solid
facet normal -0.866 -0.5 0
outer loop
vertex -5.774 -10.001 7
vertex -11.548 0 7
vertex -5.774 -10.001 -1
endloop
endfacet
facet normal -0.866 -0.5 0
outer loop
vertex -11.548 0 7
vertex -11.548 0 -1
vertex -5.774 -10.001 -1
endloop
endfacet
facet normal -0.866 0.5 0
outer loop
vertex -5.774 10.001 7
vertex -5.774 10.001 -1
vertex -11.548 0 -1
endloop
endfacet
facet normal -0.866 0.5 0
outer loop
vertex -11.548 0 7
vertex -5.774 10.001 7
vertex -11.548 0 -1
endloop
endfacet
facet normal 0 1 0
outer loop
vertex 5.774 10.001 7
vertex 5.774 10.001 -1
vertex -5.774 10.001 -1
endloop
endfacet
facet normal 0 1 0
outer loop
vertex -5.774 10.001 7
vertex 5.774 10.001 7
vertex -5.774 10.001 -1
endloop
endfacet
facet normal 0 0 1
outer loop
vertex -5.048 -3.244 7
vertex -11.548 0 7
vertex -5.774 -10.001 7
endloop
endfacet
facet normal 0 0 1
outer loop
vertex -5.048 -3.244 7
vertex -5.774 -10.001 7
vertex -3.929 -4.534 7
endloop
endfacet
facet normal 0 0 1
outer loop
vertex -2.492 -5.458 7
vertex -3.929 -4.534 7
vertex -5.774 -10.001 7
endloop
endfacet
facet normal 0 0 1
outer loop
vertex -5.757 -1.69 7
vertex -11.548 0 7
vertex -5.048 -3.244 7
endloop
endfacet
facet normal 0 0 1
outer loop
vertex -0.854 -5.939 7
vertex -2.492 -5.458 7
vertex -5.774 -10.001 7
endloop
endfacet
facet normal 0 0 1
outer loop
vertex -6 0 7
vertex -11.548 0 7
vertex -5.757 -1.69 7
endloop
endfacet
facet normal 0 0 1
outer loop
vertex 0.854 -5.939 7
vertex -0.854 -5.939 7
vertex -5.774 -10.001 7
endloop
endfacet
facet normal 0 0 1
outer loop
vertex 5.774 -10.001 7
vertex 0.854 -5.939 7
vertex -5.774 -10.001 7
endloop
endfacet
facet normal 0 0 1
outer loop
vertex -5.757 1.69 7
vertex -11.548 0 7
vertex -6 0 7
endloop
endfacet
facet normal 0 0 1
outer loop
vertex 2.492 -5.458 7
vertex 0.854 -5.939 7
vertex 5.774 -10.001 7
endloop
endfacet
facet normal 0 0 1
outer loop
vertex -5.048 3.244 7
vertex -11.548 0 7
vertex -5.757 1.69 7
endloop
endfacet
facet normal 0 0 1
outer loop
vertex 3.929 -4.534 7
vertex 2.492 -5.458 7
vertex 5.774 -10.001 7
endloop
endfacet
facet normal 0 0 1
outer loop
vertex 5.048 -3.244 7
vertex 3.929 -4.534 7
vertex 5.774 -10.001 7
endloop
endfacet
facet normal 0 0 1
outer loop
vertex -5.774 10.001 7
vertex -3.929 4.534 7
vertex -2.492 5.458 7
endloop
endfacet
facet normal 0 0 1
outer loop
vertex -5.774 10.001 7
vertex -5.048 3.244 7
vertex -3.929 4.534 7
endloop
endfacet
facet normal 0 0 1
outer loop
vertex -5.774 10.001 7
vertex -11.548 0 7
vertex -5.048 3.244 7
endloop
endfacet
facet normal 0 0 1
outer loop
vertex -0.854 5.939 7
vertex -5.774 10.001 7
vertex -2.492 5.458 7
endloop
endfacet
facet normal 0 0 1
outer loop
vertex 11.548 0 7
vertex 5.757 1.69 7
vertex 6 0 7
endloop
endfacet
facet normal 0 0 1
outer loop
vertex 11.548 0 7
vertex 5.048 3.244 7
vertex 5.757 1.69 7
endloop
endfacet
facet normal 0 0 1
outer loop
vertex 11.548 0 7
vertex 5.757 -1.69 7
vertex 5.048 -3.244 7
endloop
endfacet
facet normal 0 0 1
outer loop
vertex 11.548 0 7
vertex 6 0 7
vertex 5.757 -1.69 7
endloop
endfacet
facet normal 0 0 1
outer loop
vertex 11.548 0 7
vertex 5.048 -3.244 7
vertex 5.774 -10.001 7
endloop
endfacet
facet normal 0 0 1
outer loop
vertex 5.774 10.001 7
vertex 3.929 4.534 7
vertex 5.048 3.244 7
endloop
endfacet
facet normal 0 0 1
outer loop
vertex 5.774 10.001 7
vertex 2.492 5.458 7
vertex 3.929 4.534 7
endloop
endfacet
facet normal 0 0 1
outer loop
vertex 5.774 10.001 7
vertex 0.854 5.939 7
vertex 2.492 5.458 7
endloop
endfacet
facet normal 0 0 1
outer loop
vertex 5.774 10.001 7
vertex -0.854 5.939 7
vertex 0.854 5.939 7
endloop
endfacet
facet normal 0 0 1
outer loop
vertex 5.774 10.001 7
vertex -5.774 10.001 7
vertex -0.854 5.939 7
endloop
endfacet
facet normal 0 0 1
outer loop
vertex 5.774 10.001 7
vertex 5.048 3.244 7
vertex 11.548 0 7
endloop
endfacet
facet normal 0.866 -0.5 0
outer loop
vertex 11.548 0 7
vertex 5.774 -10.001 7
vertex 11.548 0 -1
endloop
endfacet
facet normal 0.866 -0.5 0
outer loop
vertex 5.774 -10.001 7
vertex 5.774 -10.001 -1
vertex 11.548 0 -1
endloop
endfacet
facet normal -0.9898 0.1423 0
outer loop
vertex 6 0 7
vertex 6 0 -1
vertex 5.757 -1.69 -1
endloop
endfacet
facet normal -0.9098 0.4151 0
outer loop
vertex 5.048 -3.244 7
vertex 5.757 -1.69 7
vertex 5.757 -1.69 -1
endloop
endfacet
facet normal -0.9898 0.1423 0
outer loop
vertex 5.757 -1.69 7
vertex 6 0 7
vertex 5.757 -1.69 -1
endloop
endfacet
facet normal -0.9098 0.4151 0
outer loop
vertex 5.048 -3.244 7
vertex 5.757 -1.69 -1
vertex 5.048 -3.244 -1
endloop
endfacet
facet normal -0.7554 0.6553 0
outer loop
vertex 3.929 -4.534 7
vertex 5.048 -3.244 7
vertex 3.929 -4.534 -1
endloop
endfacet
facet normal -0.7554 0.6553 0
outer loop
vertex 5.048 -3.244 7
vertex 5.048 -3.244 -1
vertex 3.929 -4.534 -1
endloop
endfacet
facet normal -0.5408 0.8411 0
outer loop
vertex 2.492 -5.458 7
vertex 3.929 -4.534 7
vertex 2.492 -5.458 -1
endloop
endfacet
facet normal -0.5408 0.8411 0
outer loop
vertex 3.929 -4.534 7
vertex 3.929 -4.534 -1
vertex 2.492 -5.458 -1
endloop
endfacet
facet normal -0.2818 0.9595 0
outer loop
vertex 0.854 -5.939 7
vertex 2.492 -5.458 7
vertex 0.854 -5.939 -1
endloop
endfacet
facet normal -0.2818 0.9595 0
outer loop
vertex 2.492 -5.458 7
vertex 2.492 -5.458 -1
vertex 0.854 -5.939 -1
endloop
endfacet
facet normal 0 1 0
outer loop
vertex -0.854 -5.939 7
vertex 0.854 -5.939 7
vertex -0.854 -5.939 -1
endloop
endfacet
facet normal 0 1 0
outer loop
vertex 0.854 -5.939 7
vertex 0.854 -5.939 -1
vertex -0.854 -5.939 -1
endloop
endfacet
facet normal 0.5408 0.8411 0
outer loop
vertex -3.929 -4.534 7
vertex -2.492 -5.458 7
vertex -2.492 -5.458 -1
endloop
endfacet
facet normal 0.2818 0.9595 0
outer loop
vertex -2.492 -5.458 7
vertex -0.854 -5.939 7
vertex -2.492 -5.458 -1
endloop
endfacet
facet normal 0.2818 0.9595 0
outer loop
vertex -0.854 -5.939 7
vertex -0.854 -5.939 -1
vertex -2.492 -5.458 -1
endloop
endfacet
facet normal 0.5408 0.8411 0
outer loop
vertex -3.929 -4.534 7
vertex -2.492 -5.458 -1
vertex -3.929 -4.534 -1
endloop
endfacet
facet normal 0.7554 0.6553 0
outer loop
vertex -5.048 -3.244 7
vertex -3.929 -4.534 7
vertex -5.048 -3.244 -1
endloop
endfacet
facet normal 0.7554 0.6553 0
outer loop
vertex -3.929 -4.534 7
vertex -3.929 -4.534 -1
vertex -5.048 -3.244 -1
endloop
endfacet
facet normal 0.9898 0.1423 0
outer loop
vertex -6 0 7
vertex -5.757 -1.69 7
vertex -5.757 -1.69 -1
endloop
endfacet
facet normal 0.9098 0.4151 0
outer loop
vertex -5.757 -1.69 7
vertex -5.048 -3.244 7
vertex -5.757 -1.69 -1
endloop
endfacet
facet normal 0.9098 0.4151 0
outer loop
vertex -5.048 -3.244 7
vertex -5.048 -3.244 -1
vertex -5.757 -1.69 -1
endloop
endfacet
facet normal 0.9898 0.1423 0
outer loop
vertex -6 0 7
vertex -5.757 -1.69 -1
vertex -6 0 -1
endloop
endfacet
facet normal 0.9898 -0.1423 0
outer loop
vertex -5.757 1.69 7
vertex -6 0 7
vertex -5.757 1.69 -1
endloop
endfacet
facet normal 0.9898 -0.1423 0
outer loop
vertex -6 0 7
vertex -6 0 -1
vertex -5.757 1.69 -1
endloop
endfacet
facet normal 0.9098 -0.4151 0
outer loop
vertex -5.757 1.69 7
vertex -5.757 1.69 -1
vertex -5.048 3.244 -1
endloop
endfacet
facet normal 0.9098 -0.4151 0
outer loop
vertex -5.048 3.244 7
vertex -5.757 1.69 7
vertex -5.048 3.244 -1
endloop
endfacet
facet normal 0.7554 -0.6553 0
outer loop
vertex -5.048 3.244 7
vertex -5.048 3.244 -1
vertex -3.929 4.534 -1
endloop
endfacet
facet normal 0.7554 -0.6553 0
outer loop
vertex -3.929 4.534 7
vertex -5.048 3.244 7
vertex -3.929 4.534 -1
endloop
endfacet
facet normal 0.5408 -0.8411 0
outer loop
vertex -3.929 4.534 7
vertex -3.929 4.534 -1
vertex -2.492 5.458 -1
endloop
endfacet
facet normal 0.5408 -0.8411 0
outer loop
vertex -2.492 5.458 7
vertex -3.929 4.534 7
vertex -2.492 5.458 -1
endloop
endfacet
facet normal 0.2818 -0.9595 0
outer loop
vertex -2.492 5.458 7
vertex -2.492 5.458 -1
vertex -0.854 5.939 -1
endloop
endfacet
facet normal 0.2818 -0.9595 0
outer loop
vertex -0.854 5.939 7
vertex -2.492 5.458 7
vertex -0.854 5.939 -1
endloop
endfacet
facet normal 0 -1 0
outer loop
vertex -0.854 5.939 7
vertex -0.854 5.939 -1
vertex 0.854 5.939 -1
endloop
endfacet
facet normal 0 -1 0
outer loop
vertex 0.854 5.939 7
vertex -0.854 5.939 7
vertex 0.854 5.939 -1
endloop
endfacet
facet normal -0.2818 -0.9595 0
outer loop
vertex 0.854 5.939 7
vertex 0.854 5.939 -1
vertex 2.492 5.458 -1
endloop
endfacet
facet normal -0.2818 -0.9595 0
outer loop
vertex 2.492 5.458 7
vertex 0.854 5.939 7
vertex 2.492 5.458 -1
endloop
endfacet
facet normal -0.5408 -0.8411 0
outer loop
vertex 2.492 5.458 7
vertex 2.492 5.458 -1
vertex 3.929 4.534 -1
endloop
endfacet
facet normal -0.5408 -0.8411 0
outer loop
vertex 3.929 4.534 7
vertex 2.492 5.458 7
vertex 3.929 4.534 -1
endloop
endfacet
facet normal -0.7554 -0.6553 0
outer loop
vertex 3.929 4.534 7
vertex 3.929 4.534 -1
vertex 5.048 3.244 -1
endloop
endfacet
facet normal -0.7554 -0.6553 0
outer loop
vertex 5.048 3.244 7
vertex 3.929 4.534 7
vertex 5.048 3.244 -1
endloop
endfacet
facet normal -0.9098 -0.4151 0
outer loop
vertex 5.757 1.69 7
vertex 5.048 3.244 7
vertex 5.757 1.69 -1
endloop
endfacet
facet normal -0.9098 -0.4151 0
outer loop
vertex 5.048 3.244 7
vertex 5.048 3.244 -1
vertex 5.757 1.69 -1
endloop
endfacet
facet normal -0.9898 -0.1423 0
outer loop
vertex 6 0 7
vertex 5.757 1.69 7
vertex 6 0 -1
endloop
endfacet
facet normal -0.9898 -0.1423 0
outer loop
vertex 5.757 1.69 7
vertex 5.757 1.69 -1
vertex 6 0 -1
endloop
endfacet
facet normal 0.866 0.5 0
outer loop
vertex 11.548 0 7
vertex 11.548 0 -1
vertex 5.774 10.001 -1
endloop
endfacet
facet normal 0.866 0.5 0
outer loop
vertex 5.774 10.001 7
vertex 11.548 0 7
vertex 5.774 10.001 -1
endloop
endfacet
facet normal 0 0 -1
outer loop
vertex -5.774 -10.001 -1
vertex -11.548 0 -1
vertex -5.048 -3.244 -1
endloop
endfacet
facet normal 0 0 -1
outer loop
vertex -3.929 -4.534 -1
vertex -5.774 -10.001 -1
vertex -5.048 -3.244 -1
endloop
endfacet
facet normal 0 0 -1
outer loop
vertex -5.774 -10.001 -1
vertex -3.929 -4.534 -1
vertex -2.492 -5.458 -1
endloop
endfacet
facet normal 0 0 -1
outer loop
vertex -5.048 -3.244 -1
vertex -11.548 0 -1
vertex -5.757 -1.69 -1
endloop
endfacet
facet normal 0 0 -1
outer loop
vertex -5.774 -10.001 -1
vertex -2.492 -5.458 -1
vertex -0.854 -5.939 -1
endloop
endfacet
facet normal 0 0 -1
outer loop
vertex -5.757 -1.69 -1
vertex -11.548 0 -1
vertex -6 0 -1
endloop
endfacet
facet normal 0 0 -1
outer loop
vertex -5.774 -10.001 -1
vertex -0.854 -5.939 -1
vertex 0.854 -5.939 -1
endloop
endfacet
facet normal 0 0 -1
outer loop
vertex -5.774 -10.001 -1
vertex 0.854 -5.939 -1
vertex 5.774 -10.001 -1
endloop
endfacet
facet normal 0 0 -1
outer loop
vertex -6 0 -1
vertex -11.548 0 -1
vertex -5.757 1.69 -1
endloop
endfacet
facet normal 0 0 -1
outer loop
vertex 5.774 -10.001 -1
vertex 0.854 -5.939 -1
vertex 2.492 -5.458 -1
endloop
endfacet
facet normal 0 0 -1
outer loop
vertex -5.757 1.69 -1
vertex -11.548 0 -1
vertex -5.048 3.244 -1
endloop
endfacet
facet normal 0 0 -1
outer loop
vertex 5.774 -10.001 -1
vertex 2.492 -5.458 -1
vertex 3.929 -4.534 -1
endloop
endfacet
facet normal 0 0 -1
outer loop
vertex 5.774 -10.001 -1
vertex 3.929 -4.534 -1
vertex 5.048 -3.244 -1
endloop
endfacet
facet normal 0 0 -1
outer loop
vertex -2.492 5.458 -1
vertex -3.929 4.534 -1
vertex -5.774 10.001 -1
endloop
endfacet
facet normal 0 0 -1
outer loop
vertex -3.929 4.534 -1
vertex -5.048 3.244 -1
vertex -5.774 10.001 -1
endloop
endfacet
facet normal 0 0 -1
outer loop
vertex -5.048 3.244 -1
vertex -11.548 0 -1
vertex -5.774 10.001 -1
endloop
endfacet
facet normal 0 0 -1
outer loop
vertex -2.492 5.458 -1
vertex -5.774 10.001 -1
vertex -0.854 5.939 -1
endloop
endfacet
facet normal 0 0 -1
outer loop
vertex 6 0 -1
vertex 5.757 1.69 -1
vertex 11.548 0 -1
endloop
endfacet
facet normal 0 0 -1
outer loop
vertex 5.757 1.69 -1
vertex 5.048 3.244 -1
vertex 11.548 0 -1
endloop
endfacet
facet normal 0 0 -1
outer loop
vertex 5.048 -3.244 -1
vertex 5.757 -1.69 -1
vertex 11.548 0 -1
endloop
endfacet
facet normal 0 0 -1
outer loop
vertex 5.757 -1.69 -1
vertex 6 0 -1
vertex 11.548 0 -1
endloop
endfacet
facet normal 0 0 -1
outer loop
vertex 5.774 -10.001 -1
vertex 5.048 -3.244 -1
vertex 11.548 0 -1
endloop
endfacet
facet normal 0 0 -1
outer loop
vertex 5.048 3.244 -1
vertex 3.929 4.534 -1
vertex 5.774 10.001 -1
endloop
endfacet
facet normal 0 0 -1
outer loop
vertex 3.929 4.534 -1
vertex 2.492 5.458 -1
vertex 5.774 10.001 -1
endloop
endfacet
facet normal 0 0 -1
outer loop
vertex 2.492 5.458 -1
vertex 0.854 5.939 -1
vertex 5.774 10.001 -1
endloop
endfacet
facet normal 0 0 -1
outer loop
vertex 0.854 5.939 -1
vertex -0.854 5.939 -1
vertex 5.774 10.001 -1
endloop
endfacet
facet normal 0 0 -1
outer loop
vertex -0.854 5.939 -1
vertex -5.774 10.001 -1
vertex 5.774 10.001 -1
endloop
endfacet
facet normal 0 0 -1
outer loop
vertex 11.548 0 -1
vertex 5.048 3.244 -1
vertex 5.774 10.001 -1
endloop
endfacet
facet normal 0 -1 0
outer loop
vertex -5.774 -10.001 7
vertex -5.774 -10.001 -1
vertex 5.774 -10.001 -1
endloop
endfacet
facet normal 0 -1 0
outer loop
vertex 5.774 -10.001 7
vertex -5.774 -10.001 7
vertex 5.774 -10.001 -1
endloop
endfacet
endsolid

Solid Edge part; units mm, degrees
sketch "Sketch1" plane through (0, 0, 0) normal (0, 0, 1) x (1, 0, 0)
  circle A0 centre (0, 0) radius 6
  line L0 (-5.7741, 10.001) -> (-11.5482, 0)
  line L1 (-11.5482, 0) -> (-5.7741, -10.001)
  line L2 (-5.7741, -10.001) -> (5.7741, -10.001)
  line L3 (5.7741, -10.001) -> (11.5482, 0)
  line L4 (11.5482, 0) -> (5.7741, 10.001)
  line L5 (5.7741, 10.001) -> (-5.7741, 10.001)
extrude "ExtrudedProtrusion_1" add sketch "Sketch1" along normal blind 7 and the other way blind 1
properties material "Steel"
